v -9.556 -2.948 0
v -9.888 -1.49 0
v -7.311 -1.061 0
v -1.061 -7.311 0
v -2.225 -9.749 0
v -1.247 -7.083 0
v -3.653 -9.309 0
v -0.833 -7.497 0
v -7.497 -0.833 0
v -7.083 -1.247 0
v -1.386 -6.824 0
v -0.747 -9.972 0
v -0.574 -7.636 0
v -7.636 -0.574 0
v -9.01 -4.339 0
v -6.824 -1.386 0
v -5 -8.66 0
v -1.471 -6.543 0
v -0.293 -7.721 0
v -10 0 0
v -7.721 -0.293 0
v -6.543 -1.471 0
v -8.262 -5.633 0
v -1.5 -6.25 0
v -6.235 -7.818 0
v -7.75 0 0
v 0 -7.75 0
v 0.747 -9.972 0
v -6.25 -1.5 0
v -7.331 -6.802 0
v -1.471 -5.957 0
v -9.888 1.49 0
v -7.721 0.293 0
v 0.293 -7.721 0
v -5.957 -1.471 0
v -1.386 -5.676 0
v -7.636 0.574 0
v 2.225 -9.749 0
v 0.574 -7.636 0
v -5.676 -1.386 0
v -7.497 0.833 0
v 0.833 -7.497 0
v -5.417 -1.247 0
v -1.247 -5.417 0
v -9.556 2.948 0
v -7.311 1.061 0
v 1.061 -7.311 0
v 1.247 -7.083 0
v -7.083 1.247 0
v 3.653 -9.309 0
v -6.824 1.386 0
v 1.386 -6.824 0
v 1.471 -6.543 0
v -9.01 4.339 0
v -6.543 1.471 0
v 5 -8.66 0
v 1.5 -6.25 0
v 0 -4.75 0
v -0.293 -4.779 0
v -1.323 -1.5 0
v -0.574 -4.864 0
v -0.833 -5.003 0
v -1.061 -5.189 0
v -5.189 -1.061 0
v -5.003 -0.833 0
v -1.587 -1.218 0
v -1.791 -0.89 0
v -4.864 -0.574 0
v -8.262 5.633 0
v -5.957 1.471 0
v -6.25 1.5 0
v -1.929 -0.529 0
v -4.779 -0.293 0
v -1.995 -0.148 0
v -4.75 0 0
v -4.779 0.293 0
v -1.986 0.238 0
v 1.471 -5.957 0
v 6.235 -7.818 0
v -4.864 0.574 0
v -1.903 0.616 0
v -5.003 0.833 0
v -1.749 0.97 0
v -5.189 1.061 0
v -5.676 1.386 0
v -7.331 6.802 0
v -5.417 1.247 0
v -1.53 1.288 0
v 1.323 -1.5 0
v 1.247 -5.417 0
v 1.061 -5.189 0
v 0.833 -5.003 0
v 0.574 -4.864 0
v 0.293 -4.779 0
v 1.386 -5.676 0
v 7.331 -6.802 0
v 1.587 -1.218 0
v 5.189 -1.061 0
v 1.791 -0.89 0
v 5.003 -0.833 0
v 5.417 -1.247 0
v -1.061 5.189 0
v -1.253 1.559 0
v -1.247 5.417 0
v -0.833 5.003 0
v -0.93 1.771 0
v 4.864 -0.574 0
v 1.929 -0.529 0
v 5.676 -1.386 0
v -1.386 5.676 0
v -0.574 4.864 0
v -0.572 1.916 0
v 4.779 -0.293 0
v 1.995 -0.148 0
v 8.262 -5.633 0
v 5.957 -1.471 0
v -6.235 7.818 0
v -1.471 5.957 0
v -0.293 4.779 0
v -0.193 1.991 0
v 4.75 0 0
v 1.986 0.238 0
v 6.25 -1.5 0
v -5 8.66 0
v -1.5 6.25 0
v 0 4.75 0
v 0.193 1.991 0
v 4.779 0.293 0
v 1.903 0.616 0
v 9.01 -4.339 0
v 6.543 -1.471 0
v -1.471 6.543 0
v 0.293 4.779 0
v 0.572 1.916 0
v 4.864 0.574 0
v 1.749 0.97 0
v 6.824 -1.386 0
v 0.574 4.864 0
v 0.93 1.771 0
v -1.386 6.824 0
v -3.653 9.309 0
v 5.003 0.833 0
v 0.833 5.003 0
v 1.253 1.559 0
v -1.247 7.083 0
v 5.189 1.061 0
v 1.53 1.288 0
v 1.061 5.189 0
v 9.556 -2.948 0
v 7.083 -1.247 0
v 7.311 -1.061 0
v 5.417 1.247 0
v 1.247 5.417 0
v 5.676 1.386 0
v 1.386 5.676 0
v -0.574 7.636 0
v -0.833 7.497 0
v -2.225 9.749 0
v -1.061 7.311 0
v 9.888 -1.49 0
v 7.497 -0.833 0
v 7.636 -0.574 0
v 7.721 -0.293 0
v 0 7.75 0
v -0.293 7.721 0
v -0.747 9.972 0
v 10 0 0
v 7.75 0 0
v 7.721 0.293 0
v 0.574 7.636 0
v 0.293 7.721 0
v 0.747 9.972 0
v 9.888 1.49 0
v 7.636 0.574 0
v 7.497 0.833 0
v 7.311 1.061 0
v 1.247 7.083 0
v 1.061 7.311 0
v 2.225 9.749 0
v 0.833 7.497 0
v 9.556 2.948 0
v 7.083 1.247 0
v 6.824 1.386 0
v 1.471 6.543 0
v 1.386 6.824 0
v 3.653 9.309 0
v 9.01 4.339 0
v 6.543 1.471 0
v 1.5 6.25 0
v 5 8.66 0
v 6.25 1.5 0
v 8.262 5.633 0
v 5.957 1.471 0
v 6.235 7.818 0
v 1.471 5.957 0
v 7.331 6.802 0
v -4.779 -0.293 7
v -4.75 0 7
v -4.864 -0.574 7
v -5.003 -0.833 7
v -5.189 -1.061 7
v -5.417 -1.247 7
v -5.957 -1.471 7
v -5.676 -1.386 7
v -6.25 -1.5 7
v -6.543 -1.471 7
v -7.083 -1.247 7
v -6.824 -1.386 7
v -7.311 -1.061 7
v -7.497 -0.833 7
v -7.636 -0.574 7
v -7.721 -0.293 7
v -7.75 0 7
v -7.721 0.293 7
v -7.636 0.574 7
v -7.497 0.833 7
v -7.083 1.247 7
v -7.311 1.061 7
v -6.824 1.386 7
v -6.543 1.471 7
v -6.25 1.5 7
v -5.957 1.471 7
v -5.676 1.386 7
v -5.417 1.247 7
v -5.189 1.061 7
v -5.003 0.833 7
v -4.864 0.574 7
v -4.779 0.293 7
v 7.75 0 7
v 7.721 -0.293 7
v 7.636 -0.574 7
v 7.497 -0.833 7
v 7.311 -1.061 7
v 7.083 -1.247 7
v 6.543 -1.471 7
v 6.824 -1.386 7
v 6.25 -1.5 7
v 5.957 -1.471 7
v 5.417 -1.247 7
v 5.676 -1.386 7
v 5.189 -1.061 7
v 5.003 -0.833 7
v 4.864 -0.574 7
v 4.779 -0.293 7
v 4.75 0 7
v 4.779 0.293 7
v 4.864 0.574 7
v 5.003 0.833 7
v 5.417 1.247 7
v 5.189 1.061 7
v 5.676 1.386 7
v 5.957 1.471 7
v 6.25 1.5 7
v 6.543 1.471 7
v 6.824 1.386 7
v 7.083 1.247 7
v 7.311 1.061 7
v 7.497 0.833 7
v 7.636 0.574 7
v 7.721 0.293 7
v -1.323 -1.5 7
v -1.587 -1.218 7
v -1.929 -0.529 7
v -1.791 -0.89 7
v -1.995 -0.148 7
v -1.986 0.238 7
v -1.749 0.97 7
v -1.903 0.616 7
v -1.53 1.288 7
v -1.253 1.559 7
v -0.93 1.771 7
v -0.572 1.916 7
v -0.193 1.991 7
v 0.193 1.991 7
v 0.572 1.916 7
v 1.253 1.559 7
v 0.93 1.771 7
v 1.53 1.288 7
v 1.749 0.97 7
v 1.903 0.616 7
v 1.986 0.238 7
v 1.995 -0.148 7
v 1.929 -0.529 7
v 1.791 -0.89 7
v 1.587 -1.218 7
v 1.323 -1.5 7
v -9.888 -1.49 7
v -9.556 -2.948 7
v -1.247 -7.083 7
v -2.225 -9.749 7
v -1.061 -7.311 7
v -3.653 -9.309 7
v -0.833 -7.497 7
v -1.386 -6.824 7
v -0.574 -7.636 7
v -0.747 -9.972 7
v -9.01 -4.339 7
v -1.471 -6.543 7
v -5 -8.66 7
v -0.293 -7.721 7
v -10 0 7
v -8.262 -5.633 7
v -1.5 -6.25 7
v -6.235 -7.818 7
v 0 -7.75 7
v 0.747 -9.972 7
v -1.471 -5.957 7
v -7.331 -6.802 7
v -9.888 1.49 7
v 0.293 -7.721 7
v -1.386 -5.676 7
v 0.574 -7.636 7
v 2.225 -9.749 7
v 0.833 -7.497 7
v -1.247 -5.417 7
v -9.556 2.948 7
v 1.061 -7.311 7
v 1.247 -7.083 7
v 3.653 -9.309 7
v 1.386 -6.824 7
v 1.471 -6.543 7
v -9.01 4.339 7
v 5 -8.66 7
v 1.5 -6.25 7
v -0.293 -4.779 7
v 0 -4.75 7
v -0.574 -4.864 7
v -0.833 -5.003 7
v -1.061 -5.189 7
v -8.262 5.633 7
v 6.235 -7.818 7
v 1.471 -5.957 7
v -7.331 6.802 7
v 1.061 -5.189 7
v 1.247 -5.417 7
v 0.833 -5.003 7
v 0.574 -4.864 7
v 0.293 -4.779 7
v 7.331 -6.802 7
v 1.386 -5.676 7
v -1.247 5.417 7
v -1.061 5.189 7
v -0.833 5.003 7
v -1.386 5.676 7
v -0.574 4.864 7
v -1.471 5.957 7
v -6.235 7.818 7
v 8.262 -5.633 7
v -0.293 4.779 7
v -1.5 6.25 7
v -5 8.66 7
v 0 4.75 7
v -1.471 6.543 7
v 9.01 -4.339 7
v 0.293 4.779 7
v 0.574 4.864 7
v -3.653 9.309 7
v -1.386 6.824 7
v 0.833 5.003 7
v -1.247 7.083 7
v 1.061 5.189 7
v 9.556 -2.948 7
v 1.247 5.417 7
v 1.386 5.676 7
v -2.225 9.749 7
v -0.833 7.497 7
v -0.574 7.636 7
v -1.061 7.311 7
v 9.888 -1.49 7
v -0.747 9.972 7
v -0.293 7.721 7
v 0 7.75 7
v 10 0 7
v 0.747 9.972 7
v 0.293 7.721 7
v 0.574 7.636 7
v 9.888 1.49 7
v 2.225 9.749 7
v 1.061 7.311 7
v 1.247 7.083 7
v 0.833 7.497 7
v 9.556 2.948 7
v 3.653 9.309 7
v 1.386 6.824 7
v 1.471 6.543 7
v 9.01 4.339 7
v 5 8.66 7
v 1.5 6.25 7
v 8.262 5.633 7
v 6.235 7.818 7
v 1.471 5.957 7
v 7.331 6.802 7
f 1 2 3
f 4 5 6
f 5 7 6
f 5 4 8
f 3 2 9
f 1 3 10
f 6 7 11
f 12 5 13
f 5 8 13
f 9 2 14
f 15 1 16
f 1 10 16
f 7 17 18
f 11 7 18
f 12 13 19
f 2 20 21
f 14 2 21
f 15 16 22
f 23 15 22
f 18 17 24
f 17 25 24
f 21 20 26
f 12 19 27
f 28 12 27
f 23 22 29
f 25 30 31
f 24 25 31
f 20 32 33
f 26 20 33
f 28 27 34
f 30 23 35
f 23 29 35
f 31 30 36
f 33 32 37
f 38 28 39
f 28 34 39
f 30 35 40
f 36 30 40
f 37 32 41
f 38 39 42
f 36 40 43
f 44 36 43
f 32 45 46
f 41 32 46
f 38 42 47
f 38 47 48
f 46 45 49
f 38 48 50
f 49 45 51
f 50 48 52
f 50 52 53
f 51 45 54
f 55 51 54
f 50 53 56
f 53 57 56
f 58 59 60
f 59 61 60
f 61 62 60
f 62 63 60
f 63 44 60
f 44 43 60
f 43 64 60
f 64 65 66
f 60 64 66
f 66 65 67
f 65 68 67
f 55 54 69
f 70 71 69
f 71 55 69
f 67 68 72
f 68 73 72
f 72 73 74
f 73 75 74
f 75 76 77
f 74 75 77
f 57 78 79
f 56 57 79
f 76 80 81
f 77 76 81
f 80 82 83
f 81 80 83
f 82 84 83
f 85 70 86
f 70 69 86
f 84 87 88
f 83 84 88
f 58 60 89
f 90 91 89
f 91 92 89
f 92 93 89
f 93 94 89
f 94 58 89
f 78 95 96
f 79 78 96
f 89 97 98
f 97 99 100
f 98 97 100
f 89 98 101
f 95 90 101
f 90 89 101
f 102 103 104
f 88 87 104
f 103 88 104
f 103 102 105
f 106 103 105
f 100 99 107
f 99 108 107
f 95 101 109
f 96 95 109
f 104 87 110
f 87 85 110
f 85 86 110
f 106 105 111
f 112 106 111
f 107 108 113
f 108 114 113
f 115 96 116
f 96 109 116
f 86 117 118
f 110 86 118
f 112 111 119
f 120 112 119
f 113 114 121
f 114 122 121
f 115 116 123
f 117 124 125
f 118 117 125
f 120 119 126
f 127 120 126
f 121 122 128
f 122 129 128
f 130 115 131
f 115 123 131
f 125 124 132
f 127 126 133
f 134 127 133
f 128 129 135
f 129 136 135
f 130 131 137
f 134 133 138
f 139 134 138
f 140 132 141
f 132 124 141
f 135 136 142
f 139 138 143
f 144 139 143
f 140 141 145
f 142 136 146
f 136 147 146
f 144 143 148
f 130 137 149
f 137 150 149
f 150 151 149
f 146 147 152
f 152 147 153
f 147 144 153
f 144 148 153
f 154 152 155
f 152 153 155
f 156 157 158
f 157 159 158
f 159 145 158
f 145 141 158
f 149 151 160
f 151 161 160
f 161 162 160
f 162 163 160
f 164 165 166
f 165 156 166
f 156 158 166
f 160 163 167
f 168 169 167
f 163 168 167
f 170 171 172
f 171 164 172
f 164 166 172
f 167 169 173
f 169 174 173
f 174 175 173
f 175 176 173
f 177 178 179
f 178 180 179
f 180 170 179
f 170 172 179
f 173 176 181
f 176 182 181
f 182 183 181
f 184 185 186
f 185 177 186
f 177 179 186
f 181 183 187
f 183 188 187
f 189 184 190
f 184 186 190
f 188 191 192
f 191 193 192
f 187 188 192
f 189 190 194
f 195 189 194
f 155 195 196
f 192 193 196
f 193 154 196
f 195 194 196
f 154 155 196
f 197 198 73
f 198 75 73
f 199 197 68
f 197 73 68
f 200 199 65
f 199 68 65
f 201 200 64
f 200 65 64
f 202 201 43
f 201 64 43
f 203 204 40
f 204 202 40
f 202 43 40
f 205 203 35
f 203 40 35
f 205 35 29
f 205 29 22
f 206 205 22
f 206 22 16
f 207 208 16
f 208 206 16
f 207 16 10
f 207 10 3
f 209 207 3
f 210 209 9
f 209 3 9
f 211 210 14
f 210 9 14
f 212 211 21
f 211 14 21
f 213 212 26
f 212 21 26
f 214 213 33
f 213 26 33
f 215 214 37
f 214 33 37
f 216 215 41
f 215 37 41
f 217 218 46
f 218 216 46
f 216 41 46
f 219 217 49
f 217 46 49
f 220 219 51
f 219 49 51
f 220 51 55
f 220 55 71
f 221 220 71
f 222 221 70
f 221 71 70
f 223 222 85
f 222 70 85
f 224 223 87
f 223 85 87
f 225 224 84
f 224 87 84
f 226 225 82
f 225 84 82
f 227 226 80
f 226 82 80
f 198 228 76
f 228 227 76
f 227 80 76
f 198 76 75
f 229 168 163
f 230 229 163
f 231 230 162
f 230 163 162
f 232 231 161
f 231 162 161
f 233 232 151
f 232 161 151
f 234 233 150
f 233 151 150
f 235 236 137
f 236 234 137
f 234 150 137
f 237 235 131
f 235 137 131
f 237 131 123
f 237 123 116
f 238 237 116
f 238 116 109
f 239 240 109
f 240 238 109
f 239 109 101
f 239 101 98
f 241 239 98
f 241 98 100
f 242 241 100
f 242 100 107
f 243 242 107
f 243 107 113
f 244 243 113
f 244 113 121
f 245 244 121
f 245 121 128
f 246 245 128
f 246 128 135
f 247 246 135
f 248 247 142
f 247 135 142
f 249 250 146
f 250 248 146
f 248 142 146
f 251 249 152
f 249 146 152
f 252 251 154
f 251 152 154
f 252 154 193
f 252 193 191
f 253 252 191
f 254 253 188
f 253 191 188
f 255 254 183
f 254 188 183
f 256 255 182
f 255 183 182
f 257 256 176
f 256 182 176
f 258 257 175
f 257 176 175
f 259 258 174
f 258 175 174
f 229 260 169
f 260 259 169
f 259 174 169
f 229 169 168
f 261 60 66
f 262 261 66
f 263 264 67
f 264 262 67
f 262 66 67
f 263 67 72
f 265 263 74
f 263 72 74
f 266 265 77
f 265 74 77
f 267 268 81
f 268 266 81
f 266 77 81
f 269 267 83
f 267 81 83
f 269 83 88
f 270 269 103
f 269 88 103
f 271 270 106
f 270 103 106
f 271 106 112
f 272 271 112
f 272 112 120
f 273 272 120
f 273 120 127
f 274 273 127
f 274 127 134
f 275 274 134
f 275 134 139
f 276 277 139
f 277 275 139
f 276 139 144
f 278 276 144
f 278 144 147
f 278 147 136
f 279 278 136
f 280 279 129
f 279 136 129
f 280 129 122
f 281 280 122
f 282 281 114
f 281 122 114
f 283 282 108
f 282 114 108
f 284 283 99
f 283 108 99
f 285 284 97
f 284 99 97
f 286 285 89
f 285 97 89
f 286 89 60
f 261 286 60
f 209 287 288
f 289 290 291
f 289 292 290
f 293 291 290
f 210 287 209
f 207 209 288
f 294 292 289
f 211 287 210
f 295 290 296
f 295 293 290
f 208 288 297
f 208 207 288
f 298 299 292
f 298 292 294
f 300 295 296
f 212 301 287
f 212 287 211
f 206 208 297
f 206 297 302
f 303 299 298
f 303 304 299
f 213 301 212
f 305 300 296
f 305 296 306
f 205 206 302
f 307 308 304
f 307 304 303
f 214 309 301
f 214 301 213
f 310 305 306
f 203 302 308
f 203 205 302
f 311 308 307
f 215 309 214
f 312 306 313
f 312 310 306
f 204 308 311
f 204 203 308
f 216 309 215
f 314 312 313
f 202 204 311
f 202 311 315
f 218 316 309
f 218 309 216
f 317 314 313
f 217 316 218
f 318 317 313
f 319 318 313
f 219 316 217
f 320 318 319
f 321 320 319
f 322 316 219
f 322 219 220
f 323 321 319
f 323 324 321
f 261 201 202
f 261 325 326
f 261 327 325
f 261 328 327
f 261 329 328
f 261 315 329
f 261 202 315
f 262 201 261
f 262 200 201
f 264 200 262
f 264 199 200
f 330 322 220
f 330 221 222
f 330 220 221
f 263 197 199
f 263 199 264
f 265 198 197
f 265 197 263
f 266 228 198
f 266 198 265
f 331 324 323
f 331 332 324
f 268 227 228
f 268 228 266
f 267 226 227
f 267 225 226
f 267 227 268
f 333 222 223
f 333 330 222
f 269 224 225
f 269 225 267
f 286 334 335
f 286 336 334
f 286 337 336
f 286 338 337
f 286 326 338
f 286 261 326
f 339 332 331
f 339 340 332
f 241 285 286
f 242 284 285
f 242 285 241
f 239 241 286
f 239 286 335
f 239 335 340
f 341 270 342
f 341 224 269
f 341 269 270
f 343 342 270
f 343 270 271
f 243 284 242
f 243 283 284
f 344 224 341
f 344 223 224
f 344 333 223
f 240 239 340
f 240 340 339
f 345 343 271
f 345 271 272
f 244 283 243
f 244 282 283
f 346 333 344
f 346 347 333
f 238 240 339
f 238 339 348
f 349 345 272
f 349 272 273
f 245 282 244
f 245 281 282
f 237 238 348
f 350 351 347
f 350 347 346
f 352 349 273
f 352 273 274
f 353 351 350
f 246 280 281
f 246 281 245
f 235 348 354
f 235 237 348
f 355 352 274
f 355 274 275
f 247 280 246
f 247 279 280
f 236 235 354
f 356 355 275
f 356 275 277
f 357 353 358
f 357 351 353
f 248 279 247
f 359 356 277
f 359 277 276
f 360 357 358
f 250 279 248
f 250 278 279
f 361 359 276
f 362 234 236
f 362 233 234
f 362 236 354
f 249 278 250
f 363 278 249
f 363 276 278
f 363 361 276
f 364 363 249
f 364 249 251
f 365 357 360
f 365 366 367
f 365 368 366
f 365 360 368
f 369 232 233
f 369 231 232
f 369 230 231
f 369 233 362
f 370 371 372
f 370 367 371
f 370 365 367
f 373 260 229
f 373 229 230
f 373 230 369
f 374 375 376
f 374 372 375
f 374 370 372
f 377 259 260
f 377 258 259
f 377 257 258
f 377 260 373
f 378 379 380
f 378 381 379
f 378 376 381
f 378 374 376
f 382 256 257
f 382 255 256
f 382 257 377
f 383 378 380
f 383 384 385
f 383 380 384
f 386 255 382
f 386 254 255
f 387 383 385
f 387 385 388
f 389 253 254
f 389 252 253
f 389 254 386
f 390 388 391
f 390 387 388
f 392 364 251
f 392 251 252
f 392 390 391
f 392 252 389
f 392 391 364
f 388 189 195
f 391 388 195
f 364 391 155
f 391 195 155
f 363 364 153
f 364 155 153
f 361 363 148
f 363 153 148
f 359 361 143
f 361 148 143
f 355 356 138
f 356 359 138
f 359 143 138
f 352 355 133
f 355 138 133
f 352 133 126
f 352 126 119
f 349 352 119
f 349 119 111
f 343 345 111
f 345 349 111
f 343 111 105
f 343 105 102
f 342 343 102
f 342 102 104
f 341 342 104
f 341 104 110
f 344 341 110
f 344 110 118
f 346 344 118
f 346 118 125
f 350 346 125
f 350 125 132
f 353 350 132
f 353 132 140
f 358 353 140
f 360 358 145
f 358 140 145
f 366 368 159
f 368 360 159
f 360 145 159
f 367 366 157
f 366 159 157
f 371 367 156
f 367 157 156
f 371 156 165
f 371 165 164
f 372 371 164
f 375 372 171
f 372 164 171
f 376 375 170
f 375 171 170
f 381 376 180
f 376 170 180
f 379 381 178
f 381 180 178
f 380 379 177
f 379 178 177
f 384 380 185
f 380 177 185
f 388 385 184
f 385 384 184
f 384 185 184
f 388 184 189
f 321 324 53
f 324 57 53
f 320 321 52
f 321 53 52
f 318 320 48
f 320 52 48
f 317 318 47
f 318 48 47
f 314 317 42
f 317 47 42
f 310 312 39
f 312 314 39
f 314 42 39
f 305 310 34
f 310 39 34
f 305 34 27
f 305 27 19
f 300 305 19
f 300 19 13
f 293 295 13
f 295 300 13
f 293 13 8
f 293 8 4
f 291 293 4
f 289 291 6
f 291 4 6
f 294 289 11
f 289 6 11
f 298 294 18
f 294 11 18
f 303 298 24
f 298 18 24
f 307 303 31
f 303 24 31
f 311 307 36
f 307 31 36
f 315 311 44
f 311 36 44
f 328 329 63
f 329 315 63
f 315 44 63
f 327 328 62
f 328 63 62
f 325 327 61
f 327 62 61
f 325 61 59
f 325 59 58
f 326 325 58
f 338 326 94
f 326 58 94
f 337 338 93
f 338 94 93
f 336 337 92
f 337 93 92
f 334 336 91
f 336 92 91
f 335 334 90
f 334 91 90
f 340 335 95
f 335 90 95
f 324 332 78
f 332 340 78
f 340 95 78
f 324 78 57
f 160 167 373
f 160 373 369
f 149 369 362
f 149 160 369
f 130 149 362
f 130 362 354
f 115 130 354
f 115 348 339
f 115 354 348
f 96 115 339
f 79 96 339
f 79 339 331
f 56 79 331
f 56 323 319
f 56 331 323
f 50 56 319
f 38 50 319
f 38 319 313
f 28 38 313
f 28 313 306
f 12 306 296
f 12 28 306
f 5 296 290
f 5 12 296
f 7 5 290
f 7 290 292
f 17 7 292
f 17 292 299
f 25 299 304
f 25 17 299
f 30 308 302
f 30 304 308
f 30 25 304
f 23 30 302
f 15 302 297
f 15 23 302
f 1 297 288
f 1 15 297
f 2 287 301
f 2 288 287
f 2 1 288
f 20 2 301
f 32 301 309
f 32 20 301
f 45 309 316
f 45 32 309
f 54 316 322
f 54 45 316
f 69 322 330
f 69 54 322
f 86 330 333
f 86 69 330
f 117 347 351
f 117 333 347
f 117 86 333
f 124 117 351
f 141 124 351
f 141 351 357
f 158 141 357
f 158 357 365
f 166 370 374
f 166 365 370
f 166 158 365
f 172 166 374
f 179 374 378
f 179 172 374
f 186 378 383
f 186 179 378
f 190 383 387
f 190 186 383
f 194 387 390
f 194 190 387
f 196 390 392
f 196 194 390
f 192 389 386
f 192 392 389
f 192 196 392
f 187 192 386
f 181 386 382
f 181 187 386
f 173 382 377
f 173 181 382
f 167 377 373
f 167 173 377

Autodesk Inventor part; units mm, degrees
ref_plane "YZ Plane" through (0, 0, 0) normal (1, 0, 0) x (0, 1, 0)
ref_plane "XZ Plane" through (0, 0, 0) normal (0, 1, 0) x (-1, 0, 0)
ref_plane "XY Plane" through (0, 0, 0) normal (0, 0, 1) x (1, 0, 0)
sketch "Эскиз1" plane through (0, 0, 0) normal (0, 0, 1) x (1, 0, 0)
  circle A0 centre (0, 0) radius 10
  line L0 (0, 0) -> (-6.25, 0) construction
  line L1 (0, 0) -> (6.25, 0) construction
  circle A1 centre (-6.25, 0) radius 1.5
  circle A2 centre (6.25, 0) radius 1.5
  circle A3 centre (0, -6.25) radius 1.5
  circle A4 centre (0, 6.25) radius 1.5
  line L2 (0, 0) -> (0, -6.25) construction
  line L3 (0, 0) -> (0, 6.25) construction
  arc A5 (1.3229, -1.5) -> (-1.3229, -1.5) centre (0, 0) ccw
  line L4 (0, 0) -> (0, -1.5) construction
  line L5 (1.3229, -1.5) -> (-1.3229, -1.5)
  dimension "d0" = 20
  dimension "d1" = 6.25
  dimension "d2" = 6.25
  dimension "d3" = 3
  dimension "d4" = 3
  dimension "d7" = 90
  dimension "d9" = 4
  dimension "d10" = 1.5
extrude "Выдавливание1" add sketch "Эскиз1" along normal blind 7
properties part number "sleeve for kick"
